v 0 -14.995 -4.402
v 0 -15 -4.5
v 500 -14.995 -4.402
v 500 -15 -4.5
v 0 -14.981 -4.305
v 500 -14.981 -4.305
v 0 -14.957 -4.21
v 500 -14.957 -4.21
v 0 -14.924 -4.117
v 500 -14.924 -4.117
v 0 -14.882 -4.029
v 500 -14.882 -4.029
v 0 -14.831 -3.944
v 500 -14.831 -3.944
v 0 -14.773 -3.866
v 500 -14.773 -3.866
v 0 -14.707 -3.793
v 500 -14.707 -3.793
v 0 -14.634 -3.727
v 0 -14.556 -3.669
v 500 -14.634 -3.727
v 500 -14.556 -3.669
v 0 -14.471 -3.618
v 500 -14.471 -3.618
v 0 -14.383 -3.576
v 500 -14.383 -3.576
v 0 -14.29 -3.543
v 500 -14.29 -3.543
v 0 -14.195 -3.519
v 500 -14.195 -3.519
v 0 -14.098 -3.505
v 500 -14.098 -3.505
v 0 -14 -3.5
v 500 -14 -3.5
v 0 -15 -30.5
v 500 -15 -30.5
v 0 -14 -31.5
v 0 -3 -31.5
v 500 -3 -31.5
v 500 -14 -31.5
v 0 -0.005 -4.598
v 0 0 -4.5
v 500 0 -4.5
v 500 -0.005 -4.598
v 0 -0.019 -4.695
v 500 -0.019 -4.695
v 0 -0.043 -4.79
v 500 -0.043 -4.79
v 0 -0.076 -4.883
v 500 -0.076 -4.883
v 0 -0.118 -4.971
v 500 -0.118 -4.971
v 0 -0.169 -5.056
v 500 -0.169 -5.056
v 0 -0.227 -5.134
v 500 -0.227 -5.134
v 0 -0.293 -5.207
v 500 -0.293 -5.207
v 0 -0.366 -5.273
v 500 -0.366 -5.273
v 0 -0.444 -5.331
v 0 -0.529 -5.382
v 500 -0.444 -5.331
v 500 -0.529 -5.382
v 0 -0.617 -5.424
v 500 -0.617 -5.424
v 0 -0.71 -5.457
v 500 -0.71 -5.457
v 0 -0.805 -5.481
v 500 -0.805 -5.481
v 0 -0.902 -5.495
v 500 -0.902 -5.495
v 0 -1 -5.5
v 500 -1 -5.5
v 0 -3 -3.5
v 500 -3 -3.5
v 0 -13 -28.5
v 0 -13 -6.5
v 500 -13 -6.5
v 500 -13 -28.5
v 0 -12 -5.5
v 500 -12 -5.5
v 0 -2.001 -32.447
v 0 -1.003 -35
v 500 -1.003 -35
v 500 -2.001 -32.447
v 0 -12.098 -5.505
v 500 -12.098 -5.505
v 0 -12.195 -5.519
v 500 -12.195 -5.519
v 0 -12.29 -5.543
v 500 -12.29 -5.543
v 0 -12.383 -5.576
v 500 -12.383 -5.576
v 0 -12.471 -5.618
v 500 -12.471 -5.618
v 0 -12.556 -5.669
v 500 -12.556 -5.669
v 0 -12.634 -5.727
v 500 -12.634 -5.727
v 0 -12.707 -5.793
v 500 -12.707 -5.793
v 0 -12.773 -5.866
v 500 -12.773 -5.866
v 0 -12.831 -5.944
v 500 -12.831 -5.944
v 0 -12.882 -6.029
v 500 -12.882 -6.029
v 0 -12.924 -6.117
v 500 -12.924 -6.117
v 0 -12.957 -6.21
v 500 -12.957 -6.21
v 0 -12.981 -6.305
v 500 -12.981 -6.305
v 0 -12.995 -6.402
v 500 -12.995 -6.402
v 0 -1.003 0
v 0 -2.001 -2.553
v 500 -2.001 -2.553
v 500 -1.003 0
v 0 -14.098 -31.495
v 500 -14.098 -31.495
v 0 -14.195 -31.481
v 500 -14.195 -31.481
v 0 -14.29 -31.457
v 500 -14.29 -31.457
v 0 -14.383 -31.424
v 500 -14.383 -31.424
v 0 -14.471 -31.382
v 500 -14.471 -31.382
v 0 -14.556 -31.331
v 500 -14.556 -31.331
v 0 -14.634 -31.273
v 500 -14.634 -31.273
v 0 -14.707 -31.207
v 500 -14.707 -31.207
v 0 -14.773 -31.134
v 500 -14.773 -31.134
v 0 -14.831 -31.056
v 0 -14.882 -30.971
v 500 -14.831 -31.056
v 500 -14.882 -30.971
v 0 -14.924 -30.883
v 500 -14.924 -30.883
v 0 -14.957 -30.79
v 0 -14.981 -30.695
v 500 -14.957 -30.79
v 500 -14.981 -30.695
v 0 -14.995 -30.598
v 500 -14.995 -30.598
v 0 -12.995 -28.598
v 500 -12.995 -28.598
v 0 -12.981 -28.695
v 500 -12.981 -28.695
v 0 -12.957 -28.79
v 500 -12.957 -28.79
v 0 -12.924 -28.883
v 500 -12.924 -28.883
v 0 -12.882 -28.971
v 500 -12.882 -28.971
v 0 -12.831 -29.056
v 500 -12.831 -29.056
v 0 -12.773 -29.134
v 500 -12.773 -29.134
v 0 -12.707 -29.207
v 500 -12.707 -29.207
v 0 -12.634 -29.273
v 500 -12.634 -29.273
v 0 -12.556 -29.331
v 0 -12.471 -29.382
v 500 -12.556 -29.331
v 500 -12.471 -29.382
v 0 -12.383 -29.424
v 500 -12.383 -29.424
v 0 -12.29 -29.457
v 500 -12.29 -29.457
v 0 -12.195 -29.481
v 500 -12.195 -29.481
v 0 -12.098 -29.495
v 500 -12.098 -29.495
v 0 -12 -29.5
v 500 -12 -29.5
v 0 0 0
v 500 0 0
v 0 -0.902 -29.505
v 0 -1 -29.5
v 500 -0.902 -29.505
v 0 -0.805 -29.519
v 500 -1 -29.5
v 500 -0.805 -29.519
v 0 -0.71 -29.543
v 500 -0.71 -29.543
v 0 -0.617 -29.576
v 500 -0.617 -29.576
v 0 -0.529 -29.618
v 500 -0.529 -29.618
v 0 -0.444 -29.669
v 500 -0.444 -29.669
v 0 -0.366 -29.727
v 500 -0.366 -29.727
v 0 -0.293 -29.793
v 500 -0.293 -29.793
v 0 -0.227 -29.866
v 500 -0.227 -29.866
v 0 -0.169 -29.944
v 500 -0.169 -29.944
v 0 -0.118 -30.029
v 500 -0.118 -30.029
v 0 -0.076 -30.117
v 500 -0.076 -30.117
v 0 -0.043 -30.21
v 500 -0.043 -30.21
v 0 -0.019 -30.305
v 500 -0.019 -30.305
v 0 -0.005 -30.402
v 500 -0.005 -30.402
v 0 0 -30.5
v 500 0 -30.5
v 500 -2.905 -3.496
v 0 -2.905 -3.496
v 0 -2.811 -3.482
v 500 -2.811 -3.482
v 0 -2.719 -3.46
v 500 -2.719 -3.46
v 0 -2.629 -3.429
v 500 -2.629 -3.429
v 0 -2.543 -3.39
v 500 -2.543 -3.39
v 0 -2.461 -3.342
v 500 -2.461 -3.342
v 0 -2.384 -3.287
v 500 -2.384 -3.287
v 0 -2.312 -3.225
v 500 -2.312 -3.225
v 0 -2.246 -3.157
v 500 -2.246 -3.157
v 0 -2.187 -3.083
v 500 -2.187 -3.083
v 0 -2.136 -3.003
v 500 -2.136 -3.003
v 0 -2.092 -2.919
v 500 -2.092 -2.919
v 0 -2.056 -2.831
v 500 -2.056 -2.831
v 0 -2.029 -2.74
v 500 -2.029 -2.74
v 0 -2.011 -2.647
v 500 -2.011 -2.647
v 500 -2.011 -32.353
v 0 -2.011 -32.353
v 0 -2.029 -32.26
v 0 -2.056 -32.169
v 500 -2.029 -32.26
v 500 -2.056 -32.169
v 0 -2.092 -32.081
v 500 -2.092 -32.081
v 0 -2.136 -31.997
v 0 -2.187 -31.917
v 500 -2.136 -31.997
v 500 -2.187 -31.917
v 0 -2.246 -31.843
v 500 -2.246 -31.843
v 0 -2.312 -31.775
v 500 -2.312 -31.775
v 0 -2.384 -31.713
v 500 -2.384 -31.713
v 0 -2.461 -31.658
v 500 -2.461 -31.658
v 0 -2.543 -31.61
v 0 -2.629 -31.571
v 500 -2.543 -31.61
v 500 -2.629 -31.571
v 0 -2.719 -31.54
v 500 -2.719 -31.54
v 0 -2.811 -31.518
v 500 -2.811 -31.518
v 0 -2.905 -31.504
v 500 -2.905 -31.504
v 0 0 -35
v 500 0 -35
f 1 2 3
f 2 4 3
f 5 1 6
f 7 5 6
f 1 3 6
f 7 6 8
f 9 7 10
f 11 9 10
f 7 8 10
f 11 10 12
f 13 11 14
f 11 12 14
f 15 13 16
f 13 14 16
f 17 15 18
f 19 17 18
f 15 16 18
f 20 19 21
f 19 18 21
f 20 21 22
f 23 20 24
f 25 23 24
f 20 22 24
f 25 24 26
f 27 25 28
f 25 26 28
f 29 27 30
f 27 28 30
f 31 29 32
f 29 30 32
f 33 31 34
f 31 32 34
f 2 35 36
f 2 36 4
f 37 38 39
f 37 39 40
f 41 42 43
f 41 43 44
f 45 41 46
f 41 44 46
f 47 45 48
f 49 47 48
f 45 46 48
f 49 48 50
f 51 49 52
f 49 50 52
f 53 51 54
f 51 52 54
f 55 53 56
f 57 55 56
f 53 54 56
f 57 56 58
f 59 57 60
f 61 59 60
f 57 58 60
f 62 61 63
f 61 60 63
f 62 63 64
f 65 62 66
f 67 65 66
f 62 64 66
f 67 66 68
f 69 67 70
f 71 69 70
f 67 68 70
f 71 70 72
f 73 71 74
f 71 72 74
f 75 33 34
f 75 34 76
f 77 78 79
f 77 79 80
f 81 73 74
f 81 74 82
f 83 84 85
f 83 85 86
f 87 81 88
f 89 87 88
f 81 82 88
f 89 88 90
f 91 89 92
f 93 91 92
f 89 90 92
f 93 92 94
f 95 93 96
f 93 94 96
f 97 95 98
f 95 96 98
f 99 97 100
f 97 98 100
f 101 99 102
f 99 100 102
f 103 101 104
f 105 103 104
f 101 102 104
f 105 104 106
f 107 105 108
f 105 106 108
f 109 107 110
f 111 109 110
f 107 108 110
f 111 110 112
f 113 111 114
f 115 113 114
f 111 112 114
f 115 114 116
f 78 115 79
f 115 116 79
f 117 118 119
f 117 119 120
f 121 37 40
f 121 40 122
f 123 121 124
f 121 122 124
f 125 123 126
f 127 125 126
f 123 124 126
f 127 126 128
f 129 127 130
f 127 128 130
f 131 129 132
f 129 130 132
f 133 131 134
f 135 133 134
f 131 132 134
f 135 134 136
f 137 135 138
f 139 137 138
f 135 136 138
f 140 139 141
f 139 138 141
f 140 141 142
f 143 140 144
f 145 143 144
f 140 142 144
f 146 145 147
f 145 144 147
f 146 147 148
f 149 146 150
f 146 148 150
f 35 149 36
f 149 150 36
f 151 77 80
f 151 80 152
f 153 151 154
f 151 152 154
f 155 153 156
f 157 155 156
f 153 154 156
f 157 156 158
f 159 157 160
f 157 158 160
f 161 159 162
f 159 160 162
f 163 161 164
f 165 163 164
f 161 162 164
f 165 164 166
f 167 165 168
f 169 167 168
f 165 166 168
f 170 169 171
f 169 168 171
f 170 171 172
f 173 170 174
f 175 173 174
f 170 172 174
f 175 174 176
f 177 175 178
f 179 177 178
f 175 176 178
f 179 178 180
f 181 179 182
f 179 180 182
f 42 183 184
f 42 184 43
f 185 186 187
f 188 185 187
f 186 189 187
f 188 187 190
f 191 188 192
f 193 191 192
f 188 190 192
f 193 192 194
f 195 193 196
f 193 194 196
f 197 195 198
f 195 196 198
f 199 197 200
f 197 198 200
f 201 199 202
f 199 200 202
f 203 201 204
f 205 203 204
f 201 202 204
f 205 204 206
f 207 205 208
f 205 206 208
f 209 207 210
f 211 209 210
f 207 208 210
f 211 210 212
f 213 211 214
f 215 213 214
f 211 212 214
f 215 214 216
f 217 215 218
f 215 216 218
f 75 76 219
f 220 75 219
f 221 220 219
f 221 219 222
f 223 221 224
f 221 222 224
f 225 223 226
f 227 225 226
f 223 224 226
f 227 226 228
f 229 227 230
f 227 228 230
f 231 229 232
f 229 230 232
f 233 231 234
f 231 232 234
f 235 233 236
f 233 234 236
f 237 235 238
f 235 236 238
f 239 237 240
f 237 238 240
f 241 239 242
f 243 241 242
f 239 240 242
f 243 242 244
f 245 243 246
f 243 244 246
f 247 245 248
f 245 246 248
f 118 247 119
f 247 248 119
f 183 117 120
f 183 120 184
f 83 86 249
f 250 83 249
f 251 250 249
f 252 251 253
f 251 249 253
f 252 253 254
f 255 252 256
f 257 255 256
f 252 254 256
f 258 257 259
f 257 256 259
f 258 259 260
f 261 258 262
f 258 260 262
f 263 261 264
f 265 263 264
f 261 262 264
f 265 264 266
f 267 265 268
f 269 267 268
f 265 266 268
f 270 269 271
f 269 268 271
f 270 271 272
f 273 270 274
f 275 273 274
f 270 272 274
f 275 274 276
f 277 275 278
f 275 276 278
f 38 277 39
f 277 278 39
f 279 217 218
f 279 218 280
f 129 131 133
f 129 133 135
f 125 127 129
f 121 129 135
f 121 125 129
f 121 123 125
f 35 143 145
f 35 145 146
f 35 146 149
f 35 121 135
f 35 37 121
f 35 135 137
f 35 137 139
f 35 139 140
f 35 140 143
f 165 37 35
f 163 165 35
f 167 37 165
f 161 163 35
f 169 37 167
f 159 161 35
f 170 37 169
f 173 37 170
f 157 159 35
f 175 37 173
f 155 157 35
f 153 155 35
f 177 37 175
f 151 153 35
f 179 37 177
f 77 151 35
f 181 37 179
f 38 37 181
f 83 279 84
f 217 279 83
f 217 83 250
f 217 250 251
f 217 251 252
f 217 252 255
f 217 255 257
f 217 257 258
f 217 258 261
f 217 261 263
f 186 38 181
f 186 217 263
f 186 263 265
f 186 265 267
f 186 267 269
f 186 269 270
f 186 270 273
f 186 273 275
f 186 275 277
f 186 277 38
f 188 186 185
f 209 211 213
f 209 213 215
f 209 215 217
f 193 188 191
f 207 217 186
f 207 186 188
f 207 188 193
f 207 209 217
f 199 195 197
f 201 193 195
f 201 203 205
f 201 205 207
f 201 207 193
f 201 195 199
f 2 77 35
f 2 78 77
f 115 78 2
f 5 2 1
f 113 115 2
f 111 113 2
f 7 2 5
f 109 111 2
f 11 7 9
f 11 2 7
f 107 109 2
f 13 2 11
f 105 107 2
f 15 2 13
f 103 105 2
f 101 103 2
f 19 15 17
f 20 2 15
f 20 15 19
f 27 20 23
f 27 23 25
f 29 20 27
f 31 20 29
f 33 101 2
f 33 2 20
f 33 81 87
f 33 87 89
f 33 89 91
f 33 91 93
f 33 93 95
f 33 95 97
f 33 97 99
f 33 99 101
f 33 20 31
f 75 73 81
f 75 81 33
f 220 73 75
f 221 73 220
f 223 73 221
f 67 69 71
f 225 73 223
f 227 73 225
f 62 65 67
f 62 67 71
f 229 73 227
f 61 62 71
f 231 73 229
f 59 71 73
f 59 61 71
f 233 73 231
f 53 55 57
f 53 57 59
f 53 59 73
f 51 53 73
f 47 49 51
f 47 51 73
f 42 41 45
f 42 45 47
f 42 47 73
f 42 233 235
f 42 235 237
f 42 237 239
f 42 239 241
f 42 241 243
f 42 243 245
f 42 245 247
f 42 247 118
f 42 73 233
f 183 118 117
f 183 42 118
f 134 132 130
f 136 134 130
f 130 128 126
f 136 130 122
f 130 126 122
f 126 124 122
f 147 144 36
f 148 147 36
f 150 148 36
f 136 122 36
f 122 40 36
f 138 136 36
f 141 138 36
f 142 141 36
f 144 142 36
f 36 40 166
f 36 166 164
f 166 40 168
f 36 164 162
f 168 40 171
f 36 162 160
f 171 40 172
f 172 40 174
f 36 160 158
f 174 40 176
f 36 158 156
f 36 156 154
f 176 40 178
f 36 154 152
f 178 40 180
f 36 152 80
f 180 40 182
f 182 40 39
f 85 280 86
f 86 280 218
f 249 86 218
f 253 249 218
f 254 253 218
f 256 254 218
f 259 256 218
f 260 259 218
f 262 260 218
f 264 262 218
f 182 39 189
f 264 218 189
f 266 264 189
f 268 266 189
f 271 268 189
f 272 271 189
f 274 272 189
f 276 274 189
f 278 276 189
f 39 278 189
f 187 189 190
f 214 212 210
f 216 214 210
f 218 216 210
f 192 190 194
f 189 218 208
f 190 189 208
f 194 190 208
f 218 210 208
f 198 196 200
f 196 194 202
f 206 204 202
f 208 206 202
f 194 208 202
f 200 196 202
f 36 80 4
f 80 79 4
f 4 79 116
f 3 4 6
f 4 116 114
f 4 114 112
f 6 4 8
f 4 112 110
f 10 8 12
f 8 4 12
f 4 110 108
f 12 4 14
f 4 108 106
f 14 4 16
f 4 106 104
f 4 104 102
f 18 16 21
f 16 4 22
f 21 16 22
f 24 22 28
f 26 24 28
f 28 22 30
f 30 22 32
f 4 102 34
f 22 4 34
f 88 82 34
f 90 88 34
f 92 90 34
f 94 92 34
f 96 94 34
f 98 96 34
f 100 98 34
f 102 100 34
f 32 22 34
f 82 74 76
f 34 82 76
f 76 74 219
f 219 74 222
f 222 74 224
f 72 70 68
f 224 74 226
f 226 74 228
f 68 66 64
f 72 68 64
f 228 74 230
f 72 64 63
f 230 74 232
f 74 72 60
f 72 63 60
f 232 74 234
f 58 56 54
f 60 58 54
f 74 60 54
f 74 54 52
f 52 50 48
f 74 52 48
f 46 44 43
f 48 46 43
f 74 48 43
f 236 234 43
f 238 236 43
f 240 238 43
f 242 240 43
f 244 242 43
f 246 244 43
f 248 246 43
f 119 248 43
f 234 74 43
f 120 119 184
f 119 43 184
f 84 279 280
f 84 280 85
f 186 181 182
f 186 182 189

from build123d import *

# Parameters (mm, degrees)
BOSS_EXTRU_1_DEPTH = 500
CONG_1_R           = 1
CHANFREIN1_DEPTH   = 500


with BuildPart() as part:
    # Esquisse1 → Boss.-Extru.1 (new body)
    with BuildSketch(Plane(origin=(0, 0, 0), x_dir=(0, 0, -1), z_dir=(1, 0, 0))):
        Polygon((0, 0), (5.5, 0), (5.5, -13), (29.5, -13), (29.5, 0), (35, 0), (35, -2), (31.5, -2), (31.5, -15), (3.5, -15), (3.5, -2), (0, -2), align=None)
    extrude(amount=BOSS_EXTRU_1_DEPTH)

    # Congé1
    cong_1_edges = [part.edges().sort_by_distance(p)[0] for p in [
        (250, 0, -5.5),
        (250, -13, -5.5),
        (250, -13, -29.5),
        (250, 0, -29.5),
        (250, -2, -31.5),
        (250, -15, -31.5),
        (250, -15, -3.5),
        (250, -2, -3.5),
    ]]
    fillet(cong_1_edges, radius=CONG_1_R)

    # Chanfrein1: read off the stored shape, not the designer's step
    # Chanfrein1 outline → Chanfrein1 (cut)
    with BuildSketch(Plane.YZ):
        with BuildLine():
            Line((-2.001381418, -2.552544532), (-1.002762836, 0))
            Line((-1.002762836, 0), (-2, 0))
            Line((-2, 0), (-2, -2.5))
            ThreePointArc((-2, -2.5), (-2.000345414, -2.526281344), (-2.001381418, -2.552544532))
        make_face()
        with BuildLine():
            Line((-1.002762836, -35), (-2.001381418, -32.447455468))
            ThreePointArc((-2.001381418, -32.447455468), (-2.000345414, -32.473718656), (-2, -32.5))
            Line((-2, -32.5), (-2, -35))
            Line((-2, -35), (-1.002762836, -35))
        make_face()
    extrude(amount=CHANFREIN1_DEPTH, mode=Mode.SUBTRACT)


solid = part.part
